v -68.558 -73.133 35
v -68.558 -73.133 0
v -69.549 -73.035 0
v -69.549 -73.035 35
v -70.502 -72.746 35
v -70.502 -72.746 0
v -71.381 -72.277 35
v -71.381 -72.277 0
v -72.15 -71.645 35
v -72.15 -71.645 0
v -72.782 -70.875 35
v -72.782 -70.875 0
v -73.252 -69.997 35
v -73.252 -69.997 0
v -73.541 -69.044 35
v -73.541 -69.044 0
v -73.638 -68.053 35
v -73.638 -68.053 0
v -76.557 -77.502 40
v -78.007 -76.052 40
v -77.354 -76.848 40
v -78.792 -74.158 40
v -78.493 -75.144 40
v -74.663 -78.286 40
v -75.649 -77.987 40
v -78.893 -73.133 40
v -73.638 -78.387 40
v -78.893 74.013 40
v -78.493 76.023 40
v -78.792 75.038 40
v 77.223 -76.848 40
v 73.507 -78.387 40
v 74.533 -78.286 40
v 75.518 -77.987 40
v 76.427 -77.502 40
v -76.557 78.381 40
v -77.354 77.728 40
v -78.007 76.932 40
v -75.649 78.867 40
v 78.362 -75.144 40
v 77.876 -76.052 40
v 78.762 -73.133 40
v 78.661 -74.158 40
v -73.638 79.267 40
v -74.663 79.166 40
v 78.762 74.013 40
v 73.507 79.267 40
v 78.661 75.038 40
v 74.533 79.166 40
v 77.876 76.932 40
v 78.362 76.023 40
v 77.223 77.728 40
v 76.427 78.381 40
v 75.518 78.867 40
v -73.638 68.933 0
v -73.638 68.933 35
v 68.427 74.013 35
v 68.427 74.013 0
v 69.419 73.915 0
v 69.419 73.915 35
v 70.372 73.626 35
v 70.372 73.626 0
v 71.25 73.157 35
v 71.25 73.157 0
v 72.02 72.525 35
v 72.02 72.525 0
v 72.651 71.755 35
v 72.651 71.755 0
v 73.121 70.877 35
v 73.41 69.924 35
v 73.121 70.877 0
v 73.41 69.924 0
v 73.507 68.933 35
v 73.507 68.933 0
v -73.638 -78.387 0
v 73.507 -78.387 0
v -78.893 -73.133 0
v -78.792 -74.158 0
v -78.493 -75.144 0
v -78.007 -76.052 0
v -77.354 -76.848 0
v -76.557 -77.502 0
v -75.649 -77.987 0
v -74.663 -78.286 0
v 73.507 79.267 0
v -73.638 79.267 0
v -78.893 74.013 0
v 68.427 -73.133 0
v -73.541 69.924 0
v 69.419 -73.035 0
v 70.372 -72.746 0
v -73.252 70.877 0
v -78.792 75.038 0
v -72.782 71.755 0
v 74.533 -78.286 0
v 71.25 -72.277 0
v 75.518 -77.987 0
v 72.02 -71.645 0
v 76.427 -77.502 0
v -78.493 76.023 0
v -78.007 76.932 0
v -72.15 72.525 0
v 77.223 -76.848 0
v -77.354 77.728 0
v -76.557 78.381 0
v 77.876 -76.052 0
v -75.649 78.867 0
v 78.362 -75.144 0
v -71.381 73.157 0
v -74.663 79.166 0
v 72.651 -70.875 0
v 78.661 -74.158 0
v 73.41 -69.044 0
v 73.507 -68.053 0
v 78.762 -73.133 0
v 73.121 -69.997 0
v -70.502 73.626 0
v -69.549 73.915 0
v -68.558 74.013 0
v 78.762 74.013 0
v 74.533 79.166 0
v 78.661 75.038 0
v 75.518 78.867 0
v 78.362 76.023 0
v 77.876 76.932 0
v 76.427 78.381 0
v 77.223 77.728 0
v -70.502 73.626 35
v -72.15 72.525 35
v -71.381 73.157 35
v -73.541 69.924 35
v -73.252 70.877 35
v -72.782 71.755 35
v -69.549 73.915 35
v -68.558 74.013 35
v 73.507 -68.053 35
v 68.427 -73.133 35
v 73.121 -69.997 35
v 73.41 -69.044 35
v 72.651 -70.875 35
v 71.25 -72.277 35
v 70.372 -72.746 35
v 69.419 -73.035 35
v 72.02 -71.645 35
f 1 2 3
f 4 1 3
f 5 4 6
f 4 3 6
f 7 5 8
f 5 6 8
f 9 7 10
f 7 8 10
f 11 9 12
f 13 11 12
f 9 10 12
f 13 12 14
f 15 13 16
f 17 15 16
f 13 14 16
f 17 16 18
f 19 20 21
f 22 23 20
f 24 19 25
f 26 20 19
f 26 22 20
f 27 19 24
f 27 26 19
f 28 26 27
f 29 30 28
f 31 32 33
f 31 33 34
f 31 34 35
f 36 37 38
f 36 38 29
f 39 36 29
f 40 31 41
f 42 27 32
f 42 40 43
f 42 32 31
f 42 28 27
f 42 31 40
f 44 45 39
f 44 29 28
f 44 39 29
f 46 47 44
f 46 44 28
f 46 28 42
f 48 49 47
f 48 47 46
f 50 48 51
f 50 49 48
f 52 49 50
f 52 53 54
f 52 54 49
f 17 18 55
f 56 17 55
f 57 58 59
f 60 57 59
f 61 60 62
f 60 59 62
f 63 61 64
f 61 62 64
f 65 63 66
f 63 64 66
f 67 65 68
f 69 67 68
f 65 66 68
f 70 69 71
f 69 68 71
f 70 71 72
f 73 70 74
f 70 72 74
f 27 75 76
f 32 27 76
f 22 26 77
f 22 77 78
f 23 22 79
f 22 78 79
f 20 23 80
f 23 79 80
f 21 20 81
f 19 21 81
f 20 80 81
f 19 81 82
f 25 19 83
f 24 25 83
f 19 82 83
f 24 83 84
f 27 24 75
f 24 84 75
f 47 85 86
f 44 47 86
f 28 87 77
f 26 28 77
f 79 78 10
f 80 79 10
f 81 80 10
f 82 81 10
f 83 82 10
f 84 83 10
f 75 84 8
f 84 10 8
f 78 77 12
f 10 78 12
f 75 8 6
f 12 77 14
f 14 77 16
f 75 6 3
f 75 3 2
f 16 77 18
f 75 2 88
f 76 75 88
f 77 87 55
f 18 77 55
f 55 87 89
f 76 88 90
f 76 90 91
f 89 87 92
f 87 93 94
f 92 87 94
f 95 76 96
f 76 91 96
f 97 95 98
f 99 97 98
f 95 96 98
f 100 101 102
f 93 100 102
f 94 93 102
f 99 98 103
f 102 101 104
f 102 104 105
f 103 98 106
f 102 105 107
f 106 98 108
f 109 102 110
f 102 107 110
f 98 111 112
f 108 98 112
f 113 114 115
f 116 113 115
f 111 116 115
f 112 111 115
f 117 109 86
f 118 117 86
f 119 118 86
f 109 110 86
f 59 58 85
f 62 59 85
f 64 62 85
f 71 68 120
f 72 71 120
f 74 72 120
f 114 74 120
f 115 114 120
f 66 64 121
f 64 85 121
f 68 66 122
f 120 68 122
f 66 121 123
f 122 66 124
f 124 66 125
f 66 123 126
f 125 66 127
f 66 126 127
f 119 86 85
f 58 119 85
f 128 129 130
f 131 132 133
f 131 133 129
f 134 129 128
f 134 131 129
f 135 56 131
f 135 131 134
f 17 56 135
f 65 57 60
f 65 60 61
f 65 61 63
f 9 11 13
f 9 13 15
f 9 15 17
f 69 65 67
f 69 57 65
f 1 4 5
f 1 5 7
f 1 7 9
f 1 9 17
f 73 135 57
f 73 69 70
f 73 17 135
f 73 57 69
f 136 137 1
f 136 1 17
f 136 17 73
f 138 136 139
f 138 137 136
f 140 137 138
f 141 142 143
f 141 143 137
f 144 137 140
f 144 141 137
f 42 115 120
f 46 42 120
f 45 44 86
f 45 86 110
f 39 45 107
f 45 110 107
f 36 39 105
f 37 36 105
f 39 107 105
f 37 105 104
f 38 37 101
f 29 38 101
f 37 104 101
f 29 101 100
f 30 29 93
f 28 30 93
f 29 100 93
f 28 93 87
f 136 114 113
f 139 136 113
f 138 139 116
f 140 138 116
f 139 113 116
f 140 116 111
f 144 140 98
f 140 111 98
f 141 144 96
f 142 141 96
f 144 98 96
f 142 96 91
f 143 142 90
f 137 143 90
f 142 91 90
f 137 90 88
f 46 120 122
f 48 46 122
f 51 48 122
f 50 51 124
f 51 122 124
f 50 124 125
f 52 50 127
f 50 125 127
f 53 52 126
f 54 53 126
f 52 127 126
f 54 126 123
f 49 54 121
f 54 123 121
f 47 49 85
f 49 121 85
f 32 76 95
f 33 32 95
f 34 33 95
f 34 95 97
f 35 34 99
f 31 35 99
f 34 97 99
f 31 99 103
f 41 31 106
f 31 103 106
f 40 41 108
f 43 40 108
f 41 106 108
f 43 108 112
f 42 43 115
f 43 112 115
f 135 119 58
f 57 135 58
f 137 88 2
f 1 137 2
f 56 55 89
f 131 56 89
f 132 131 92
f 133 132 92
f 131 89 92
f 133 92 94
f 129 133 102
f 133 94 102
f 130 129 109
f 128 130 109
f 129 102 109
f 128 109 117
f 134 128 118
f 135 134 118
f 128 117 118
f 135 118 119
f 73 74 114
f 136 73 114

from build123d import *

# Parameters (mm, degrees)
F1_DEPTH = 40
F3_DEPTH = 35


with BuildPart() as f1:
    # F0 (on Top) → F1 (new body)
    with BuildSketch(Plane.XY):
        with BuildLine():
            Line((73.507474, 79.266992), (-73.638234, 79.266992))
            ThreePointArc((-73.638234, 79.266992), (-77.353579, 77.728046), (-78.892526, 74.0127))
            Line((-78.892526, 74.0127), (-78.892526, -73.133008))
            ThreePointArc((-78.892526, -73.133008), (-77.353579, -76.848354), (-73.638234, -78.3873))
            Line((-73.638234, -78.3873), (73.507474, -78.3873))
            ThreePointArc((73.507474, -78.3873), (77.22282, -76.848354), (78.761766, -73.133008))
            Line((78.761766, -73.133008), (78.761766, 74.0127))
            ThreePointArc((78.761766, 74.0127), (77.22282, 77.728046), (73.507474, 79.266992))
        make_face()
    extrude(amount=F1_DEPTH)

    # F2 (on face) → F3 (cut)
    with BuildSketch(Plane(origin=(0, 0, 0), x_dir=(1, 0, 0), z_dir=(0, 0, -1))):
        with BuildLine():
            Line((68.427474, 73.133008), (-68.558234, 73.133008))
            ThreePointArc((-68.558234, 73.133008), (-72.150336, 71.64511), (-73.638234, 68.053008))
            Line((-73.638234, 68.053008), (-73.638234, -68.9327))
            ThreePointArc((-73.638234, -68.9327), (-72.150336, -72.524802), (-68.558234, -74.0127))
            Line((-68.558234, -74.0127), (68.427474, -74.0127))
            ThreePointArc((68.427474, -74.0127), (72.019576, -72.524802), (73.507474, -68.9327))
            Line((73.507474, -68.9327), (73.507474, 68.053008))
            ThreePointArc((73.507474, 68.053008), (72.019576, 71.64511), (68.427474, 73.133008))
        make_face()
    extrude(amount=-F3_DEPTH, mode=Mode.SUBTRACT)


solid = f1.part
